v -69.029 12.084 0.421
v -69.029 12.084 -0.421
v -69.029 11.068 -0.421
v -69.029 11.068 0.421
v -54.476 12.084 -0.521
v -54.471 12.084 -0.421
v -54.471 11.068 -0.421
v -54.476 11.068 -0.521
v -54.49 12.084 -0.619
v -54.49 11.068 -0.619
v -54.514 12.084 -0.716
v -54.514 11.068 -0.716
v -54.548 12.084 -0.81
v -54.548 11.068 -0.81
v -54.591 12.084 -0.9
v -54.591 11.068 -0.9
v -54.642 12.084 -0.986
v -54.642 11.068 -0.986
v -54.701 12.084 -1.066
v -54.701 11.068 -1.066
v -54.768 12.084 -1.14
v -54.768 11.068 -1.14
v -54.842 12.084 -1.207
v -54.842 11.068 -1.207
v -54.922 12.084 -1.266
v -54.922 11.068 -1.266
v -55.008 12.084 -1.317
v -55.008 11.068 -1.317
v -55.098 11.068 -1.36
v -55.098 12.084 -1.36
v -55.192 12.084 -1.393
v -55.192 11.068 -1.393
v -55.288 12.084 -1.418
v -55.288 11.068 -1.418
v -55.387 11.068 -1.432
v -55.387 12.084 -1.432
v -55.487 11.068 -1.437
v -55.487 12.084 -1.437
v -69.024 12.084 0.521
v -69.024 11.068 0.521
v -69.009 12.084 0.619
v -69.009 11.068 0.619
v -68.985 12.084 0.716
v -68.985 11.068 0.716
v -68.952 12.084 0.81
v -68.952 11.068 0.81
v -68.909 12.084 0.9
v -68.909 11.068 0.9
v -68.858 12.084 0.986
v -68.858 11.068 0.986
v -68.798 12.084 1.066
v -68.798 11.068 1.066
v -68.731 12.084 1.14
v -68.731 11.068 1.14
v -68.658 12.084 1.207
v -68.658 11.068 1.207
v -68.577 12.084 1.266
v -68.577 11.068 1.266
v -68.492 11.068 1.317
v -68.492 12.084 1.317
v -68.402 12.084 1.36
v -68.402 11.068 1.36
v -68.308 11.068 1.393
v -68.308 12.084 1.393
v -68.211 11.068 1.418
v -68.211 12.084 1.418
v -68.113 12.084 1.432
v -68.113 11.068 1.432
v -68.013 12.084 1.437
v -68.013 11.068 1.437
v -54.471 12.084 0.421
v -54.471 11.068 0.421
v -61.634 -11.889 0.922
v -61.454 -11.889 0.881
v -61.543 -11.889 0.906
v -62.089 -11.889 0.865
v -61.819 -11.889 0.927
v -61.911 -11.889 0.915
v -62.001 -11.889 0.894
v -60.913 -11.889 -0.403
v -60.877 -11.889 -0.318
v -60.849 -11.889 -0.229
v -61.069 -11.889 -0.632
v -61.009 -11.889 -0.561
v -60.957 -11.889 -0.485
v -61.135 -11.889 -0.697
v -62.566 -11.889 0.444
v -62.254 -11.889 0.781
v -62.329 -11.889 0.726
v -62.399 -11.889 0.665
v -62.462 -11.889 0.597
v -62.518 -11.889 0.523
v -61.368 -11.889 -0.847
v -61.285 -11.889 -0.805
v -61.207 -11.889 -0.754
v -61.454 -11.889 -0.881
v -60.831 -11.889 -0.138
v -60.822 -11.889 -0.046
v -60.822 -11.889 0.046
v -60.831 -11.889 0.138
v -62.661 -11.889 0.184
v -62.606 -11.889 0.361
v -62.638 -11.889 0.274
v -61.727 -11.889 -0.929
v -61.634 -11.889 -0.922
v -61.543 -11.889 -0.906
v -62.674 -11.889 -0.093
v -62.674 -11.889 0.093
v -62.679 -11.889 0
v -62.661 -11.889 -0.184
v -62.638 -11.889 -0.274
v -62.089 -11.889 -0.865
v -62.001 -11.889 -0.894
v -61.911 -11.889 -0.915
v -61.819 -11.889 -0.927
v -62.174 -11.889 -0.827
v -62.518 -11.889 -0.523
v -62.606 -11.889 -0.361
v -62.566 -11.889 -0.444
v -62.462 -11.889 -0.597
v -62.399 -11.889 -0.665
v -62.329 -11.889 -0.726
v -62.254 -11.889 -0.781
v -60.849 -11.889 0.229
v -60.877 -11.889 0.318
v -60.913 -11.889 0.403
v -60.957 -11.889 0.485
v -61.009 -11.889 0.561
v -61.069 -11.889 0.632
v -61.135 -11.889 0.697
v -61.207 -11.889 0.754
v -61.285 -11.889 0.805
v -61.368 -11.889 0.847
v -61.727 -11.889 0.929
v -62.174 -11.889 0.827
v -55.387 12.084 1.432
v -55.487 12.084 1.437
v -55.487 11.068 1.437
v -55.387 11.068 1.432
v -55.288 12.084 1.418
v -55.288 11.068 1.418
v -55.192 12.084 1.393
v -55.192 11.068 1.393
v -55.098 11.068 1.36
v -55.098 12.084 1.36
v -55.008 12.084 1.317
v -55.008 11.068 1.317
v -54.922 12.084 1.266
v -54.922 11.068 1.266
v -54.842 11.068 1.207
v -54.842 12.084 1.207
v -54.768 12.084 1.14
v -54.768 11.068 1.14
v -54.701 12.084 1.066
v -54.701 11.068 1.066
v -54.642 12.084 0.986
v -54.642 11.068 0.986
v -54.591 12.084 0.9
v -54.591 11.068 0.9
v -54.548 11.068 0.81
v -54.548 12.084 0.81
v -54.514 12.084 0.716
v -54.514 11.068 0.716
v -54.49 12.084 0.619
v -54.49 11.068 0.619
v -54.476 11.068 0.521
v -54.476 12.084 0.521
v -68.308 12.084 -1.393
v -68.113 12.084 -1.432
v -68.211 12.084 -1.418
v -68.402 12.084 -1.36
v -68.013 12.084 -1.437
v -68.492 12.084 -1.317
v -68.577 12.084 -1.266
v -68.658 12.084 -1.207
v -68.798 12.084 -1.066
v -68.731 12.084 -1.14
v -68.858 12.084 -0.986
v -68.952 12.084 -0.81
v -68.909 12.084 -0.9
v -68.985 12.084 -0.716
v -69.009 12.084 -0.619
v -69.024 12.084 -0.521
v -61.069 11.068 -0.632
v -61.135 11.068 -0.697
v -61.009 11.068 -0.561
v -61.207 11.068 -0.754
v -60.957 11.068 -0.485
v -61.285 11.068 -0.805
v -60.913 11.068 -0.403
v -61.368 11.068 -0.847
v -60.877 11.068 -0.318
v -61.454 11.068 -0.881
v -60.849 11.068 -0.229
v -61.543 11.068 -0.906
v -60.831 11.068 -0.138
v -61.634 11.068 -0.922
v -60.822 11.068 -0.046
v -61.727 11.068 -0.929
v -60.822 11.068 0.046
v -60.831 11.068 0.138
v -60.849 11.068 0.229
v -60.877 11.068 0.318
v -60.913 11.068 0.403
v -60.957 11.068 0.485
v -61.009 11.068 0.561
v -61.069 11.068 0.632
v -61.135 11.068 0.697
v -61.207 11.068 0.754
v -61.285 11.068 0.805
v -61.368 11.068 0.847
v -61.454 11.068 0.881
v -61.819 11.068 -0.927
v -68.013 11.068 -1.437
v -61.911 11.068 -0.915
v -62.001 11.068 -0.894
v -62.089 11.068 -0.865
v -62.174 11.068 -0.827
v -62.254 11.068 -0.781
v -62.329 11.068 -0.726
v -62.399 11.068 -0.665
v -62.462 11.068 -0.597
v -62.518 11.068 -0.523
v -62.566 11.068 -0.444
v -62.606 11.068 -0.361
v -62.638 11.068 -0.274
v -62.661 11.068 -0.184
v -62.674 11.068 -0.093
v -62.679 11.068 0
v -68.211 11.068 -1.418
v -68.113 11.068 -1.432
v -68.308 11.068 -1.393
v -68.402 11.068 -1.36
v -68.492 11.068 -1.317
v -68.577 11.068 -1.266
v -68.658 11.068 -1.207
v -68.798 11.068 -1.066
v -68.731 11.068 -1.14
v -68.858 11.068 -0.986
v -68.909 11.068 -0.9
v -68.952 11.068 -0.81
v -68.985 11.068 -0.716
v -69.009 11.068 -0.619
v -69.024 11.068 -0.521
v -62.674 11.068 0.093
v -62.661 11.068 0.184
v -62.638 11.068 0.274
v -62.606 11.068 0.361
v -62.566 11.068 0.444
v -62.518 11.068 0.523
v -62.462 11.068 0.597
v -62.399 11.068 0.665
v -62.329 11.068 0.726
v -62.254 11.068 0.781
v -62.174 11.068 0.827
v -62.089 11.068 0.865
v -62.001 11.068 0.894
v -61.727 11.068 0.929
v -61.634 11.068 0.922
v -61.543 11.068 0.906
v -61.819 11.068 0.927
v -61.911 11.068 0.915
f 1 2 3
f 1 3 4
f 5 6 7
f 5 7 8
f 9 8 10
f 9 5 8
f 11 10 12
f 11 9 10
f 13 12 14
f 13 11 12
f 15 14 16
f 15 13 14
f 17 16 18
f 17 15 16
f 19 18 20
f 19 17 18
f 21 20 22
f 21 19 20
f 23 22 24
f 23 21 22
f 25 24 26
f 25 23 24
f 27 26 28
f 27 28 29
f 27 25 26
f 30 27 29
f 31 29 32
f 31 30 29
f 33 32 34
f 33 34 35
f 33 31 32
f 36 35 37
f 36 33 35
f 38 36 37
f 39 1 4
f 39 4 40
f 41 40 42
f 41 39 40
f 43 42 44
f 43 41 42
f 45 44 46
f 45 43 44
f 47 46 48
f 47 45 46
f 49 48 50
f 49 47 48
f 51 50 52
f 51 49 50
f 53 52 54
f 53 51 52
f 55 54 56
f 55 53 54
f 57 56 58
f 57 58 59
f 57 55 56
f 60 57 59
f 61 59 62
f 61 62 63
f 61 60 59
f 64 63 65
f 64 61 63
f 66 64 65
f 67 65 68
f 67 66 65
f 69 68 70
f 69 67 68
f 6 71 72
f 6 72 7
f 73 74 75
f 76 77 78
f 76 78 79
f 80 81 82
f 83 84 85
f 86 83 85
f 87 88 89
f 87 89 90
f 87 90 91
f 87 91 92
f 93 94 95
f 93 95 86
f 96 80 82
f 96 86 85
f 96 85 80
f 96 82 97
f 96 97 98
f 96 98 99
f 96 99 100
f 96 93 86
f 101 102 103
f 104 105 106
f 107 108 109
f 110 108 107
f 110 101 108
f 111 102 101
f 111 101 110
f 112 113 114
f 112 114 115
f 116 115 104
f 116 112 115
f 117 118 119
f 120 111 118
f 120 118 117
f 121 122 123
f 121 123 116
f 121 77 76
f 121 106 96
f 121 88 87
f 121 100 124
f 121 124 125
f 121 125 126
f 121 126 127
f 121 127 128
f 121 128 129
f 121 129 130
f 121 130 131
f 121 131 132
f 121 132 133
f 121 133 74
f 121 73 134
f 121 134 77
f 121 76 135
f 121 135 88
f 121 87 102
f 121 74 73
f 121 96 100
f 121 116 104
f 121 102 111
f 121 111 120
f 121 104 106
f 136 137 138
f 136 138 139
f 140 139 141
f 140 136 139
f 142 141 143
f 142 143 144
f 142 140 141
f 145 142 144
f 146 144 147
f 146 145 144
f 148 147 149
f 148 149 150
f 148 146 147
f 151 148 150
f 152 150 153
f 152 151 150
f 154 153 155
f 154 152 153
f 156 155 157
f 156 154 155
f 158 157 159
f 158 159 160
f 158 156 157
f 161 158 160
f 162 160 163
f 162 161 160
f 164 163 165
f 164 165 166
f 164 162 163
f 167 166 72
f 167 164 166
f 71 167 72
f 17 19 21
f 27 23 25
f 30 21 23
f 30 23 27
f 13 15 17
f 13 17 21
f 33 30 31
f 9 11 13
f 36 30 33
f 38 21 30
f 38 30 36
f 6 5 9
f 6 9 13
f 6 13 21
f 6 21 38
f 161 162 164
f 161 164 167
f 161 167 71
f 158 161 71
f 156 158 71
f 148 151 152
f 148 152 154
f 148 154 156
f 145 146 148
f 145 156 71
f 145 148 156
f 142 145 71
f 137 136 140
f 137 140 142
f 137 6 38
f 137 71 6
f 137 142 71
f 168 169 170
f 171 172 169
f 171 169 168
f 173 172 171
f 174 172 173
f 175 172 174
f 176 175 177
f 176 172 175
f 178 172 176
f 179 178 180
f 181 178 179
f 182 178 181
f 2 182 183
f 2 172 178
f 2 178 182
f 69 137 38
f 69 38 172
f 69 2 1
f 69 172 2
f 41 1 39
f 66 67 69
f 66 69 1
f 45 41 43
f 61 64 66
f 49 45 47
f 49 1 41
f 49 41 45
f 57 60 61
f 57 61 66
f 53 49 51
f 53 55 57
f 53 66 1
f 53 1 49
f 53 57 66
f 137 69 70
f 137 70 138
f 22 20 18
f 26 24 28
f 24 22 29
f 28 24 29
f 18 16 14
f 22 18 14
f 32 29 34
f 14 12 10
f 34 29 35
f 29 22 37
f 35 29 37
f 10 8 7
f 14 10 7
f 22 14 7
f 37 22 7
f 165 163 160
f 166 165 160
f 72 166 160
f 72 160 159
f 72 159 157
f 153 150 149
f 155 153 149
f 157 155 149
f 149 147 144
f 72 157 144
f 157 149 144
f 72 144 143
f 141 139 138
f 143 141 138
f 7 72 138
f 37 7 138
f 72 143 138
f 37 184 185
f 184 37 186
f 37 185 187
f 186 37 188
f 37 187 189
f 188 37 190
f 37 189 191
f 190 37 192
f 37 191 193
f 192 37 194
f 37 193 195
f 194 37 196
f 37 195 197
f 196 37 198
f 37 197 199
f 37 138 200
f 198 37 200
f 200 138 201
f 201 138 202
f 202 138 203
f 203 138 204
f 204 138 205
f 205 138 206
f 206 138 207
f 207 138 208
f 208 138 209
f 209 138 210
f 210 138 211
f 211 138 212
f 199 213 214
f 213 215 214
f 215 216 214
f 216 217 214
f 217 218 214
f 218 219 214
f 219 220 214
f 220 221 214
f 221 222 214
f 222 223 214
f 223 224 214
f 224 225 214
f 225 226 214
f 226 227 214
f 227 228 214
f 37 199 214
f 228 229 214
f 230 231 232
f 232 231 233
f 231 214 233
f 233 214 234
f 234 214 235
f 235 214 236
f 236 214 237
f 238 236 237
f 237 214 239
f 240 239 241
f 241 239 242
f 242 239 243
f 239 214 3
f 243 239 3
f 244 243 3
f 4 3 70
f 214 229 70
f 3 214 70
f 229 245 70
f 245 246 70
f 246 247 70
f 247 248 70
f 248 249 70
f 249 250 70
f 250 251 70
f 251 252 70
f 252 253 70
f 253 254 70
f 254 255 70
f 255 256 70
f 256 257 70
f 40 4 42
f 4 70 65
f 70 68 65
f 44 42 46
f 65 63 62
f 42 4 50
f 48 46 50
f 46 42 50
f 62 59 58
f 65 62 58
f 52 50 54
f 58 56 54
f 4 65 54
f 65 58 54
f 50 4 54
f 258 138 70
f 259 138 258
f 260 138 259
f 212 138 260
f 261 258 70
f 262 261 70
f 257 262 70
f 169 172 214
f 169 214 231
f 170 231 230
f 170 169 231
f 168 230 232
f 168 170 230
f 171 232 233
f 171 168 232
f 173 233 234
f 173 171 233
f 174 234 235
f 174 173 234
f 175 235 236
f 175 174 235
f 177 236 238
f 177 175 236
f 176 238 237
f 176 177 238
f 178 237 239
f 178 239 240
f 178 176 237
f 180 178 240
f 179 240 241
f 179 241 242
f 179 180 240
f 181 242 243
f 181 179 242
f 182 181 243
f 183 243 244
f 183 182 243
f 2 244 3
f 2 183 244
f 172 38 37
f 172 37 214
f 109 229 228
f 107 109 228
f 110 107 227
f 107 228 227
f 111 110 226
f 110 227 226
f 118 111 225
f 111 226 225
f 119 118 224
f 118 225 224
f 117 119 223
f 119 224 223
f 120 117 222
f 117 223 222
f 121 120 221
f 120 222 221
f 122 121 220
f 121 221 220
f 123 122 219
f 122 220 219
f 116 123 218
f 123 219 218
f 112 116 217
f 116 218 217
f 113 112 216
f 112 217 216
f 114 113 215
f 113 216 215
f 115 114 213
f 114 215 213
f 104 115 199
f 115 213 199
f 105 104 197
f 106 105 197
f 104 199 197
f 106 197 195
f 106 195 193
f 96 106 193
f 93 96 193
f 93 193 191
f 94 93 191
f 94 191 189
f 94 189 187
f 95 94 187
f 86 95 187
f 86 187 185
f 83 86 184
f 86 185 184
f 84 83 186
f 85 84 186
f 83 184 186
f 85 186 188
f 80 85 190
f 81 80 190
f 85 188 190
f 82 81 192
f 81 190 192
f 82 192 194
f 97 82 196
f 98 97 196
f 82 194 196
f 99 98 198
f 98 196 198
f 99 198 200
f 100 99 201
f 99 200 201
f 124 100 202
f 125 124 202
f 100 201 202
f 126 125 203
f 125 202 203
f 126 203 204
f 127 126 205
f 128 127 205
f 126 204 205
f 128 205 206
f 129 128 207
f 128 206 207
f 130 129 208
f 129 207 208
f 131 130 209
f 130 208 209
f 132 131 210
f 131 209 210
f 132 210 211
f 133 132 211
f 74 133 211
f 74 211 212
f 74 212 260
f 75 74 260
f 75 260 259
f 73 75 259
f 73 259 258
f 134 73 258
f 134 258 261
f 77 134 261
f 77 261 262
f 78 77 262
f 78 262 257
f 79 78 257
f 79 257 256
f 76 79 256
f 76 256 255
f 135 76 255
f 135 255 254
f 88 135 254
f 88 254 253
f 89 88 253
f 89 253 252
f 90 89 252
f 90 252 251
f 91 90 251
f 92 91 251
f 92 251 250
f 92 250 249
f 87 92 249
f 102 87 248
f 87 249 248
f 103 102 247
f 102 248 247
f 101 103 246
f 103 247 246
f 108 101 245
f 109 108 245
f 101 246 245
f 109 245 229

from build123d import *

# Parameters (mm, degrees)
F0_W     = 0.929184
F0_H     = 23.972953
F3_DEPTH = 1.016


with BuildPart() as f1:
    # F0 (on Top) → F1 (revolve)
    with BuildSketch(Plane.XY):
        with Locations((-62.214408, 0.097652)):
            Rectangle(F0_W, F0_H)
    revolve(axis=Axis((-61.749816, 0.848013, 0), (0, -1, 0)))

    # F2 (on face) → F3 (join)
    with BuildSketch(Plane(origin=(0, 12.084128, 0), x_dir=(-1, 0, 0), z_dir=(0, 1, 0))):
        with BuildLine():
            Line((68.013, 1.437184), (55.486632, 1.437184))
            ThreePointArc((55.486632, 1.437184), (54.768211, 1.139605), (54.470632, 0.421184))
            Line((54.470632, 0.421184), (54.470632, -0.421184))
            ThreePointArc((54.470632, -0.421184), (54.768211, -1.139605), (55.486632, -1.437184))
            Line((55.486632, -1.437184), (68.013, -1.437184))
            ThreePointArc((68.013, -1.437184), (68.731421, -1.139605), (69.029, -0.421184))
            Line((69.029, -0.421184), (69.029, 0.421184))
            ThreePointArc((69.029, 0.421184), (68.731421, 1.139605), (68.013, 1.437184))
        make_face()
    extrude(amount=-F3_DEPTH)


solid = f1.part
